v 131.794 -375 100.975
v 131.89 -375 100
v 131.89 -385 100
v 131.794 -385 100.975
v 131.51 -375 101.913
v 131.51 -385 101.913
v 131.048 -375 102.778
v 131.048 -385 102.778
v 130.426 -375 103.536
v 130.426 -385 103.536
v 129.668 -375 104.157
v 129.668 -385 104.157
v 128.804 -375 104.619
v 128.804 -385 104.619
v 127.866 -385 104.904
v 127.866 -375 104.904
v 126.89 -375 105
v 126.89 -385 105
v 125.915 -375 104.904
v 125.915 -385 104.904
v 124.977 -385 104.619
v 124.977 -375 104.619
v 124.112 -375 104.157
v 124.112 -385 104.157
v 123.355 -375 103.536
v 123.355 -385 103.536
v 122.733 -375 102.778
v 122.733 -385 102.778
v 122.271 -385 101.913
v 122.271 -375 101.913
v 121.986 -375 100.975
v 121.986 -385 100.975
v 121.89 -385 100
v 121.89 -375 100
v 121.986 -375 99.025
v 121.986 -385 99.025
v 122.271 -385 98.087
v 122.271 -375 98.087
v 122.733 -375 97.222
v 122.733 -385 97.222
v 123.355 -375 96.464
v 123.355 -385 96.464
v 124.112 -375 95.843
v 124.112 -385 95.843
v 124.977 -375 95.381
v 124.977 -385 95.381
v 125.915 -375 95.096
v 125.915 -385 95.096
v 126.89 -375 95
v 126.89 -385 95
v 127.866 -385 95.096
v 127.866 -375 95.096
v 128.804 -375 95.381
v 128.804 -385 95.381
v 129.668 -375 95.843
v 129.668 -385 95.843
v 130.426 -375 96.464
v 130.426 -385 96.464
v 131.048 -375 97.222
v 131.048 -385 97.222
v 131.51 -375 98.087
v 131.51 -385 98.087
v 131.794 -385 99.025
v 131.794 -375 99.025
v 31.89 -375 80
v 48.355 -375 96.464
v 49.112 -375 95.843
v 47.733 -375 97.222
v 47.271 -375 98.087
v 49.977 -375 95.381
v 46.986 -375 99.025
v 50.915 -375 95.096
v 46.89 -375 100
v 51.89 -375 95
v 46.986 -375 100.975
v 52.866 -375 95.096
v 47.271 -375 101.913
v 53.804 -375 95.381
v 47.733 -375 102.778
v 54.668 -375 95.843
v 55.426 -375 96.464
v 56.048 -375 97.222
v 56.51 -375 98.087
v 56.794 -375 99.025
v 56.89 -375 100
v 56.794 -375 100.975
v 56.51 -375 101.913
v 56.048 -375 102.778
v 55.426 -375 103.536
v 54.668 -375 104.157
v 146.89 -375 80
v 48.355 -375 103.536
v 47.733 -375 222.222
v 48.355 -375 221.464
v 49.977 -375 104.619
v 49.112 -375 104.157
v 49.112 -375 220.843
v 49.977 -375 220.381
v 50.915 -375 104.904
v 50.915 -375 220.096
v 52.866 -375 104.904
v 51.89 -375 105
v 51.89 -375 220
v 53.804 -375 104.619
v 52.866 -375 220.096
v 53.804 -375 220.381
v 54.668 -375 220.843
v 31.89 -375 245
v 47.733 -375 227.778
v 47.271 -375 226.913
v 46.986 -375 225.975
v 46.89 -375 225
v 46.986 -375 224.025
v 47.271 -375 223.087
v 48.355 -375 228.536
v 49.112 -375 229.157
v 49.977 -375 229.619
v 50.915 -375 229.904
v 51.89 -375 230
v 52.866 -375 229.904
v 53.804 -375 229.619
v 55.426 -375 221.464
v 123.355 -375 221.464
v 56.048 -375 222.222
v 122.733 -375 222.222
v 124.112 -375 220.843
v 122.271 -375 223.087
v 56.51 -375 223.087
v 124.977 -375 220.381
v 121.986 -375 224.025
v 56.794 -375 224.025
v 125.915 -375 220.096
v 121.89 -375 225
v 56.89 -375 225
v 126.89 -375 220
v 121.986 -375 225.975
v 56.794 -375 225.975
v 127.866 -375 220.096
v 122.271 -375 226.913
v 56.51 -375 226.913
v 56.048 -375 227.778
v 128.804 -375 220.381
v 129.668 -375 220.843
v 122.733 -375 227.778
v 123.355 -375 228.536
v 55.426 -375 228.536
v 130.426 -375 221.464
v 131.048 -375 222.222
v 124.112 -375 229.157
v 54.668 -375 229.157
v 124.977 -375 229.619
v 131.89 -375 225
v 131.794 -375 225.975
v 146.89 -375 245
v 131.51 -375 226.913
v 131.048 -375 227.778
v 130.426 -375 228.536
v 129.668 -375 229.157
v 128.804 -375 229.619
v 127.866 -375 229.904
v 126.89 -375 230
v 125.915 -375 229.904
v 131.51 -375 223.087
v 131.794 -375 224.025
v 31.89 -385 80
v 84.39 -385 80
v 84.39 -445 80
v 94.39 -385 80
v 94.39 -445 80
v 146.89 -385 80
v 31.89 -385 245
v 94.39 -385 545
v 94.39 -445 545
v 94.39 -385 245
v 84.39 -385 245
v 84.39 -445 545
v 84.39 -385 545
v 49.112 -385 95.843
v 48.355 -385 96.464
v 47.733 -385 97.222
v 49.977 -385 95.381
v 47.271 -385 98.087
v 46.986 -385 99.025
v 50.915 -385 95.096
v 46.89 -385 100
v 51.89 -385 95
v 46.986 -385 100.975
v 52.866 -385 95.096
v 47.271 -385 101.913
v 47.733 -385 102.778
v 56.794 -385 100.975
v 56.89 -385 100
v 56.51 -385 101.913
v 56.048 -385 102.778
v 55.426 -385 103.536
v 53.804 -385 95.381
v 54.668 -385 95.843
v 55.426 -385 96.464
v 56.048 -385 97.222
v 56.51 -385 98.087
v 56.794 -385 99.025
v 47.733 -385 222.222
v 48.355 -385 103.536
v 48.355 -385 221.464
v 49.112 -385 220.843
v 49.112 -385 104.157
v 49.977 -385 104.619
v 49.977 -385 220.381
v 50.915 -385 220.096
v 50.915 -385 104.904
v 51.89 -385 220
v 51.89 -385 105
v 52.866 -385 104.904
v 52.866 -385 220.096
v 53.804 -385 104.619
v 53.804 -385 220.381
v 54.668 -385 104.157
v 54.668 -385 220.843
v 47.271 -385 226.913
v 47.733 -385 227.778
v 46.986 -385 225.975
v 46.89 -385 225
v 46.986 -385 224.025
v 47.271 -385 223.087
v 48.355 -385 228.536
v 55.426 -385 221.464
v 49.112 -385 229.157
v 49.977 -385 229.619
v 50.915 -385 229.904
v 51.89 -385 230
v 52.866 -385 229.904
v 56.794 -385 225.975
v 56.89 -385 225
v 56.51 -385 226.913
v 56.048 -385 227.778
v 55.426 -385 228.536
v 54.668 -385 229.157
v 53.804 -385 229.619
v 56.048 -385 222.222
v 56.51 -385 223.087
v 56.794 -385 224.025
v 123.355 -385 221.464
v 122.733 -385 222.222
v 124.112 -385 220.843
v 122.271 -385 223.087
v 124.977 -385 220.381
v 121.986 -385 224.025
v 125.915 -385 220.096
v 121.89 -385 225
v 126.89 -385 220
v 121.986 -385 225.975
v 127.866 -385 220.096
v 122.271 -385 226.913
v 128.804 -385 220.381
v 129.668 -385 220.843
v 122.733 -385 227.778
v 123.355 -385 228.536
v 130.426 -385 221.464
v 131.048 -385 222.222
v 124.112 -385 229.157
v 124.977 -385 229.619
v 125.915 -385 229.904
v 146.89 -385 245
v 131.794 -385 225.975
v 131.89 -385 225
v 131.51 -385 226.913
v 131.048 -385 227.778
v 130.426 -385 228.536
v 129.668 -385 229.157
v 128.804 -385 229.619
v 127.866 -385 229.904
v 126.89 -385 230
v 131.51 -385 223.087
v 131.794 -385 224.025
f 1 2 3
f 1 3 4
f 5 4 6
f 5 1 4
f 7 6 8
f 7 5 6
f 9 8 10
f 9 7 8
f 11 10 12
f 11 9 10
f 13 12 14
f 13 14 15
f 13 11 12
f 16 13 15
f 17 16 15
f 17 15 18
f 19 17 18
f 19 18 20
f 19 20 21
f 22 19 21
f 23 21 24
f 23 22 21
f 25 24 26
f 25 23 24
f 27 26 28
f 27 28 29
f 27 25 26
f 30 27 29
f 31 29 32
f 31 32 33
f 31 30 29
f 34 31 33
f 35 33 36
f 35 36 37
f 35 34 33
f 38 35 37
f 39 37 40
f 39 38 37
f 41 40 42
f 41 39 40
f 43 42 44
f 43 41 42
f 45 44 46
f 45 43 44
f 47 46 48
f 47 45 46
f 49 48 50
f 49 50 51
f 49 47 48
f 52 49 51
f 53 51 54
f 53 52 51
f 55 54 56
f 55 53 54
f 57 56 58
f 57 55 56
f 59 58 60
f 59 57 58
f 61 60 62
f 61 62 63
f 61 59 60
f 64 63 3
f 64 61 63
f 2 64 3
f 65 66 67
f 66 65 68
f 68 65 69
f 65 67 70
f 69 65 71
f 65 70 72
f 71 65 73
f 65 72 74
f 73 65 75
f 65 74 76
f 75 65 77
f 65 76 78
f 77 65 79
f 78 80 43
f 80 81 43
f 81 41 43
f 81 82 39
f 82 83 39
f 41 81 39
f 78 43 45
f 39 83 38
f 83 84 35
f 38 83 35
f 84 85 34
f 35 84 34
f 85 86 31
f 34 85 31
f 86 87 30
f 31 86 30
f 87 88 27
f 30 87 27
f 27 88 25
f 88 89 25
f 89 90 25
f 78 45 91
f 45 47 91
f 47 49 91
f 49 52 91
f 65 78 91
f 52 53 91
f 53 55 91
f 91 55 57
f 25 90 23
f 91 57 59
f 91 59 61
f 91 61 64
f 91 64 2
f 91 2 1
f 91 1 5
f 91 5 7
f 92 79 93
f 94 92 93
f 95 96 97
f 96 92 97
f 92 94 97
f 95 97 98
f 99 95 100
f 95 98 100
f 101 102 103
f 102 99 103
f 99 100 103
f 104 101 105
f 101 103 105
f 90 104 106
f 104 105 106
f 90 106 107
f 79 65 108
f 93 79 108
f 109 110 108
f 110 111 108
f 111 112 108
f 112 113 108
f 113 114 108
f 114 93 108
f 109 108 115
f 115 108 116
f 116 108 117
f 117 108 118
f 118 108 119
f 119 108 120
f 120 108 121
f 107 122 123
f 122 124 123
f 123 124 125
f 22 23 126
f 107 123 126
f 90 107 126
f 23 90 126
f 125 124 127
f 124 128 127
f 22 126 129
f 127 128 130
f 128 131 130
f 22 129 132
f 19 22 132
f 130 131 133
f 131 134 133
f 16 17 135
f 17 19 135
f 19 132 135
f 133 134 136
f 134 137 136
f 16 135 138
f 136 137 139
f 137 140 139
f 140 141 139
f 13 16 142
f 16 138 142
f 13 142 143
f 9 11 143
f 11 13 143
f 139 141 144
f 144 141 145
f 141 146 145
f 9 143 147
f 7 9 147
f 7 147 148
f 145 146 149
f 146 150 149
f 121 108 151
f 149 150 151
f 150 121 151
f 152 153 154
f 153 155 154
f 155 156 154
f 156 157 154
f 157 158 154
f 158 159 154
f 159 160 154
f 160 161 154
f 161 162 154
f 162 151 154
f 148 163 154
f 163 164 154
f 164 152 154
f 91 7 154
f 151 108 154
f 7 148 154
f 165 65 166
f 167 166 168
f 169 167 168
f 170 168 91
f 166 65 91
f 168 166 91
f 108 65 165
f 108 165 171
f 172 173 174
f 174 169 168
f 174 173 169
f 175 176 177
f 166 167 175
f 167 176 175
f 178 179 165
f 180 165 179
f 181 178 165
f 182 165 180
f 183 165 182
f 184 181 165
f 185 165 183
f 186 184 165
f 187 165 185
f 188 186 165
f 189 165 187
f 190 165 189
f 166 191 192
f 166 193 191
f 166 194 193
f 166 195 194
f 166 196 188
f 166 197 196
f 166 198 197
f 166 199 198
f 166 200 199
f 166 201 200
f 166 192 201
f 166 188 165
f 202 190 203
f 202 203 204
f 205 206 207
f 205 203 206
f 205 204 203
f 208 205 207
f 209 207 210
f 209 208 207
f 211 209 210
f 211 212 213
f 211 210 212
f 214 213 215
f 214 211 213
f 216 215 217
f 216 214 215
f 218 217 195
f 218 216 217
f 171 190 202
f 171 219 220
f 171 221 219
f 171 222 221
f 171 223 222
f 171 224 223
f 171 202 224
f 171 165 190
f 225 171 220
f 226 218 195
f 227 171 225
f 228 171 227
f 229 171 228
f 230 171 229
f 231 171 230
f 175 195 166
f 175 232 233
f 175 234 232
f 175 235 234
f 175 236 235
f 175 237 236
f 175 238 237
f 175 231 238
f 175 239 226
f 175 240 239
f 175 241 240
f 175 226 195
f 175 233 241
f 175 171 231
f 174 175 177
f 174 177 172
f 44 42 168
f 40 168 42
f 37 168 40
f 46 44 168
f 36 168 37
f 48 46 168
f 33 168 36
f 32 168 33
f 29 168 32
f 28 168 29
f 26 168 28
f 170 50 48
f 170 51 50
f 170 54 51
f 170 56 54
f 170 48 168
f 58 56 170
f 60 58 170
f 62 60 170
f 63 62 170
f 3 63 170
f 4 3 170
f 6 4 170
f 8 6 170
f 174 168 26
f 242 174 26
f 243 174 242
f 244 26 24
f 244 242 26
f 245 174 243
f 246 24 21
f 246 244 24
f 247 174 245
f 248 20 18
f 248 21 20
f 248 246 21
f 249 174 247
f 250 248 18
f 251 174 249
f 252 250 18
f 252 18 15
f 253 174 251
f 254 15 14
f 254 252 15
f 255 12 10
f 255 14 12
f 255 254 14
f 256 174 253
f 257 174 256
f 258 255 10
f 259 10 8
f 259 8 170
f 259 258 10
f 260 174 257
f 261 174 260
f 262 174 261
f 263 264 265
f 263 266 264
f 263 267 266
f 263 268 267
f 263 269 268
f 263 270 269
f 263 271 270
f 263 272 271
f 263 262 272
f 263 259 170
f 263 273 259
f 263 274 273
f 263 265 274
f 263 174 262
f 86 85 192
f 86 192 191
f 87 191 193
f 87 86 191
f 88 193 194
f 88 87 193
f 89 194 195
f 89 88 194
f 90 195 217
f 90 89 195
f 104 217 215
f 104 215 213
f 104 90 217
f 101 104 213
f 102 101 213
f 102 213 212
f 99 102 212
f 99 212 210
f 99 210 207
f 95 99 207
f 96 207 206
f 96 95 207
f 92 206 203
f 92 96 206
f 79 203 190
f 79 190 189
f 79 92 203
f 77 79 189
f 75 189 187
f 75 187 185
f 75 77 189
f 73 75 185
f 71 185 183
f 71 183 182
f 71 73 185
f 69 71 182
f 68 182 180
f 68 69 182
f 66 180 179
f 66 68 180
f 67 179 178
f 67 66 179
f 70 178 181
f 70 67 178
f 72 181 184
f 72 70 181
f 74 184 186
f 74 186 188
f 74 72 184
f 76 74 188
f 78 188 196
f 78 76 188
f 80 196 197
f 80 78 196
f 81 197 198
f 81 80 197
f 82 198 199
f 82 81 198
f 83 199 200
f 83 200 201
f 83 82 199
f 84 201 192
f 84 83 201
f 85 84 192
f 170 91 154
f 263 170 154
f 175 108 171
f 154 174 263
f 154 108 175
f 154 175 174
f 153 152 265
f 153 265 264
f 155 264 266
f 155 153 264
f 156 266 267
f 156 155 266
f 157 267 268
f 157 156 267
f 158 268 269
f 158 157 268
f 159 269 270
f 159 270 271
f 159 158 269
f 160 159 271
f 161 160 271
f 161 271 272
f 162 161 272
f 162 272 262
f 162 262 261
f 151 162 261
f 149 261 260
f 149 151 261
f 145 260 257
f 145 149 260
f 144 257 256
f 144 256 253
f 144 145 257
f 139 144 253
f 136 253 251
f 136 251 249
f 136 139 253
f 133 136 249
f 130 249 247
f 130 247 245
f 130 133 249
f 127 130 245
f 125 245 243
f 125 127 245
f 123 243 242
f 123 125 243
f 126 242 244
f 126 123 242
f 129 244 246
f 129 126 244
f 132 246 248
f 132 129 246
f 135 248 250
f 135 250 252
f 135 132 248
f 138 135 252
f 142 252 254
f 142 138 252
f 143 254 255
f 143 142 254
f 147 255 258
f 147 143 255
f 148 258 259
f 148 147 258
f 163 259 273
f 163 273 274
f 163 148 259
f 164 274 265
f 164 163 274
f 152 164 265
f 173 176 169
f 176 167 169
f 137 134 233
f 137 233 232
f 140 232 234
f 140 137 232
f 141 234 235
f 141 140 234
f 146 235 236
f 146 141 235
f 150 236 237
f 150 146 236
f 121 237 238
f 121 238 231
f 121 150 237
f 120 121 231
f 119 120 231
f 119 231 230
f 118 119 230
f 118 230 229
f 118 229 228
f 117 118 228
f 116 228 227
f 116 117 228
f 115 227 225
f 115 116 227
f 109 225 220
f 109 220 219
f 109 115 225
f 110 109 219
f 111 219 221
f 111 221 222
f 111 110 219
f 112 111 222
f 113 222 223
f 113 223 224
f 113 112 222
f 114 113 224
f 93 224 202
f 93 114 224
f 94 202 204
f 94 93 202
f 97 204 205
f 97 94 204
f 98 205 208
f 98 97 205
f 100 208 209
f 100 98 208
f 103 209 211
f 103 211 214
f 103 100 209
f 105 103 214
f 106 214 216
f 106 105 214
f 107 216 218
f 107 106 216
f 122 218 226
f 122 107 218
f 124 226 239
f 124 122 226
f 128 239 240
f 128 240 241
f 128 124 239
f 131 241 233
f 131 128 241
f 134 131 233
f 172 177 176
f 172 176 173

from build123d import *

# Parameters (mm, degrees)
SKETCH_W     = 115
SKETCH_H     = 165
SKETCH_R     = 5
PAD_DEPTH    = 10
SKETCH001_W  = 10
SKETCH001_H  = 165
PAD001_DEPTH = 60
SKETCH002_W  = 10
SKETCH002_H  = 60
PAD002_DEPTH = 300


with BuildPart() as part:
    # Sketch (on Face1 of Copydouble_beam_01) → Pad (new body)
    with BuildSketch(Plane.XZ.offset(375)):
        with Locations((89.390244, 162.5)):
            Rectangle(SKETCH_W, SKETCH_H)
        with Locations((51.890244, 225)):
            Circle(SKETCH_R, mode=Mode.SUBTRACT)
        with Locations((126.890244, 100)):
            Circle(SKETCH_R, mode=Mode.SUBTRACT)
        with Locations((51.890244, 100)):
            Circle(SKETCH_R, mode=Mode.SUBTRACT)
        with Locations((126.890244, 225)):
            Circle(SKETCH_R, mode=Mode.SUBTRACT)
    extrude(amount=PAD_DEPTH)

    # Sketch001 (on Face10 of Pad) → Pad001 (join)
    with BuildSketch(Plane.XZ.offset(385)):
        with Locations((89.390244, 162.5)):
            Rectangle(SKETCH001_W, SKETCH001_H)
    extrude(amount=PAD001_DEPTH)

    # Sketch002 (on Face9 of Pad001) → Pad002 (join)
    with BuildSketch(Plane.XY.offset(245)):
        with Locations((89.390244, -415)):
            Rectangle(SKETCH002_W, SKETCH002_H)
    extrude(amount=PAD002_DEPTH)


solid = part.part
